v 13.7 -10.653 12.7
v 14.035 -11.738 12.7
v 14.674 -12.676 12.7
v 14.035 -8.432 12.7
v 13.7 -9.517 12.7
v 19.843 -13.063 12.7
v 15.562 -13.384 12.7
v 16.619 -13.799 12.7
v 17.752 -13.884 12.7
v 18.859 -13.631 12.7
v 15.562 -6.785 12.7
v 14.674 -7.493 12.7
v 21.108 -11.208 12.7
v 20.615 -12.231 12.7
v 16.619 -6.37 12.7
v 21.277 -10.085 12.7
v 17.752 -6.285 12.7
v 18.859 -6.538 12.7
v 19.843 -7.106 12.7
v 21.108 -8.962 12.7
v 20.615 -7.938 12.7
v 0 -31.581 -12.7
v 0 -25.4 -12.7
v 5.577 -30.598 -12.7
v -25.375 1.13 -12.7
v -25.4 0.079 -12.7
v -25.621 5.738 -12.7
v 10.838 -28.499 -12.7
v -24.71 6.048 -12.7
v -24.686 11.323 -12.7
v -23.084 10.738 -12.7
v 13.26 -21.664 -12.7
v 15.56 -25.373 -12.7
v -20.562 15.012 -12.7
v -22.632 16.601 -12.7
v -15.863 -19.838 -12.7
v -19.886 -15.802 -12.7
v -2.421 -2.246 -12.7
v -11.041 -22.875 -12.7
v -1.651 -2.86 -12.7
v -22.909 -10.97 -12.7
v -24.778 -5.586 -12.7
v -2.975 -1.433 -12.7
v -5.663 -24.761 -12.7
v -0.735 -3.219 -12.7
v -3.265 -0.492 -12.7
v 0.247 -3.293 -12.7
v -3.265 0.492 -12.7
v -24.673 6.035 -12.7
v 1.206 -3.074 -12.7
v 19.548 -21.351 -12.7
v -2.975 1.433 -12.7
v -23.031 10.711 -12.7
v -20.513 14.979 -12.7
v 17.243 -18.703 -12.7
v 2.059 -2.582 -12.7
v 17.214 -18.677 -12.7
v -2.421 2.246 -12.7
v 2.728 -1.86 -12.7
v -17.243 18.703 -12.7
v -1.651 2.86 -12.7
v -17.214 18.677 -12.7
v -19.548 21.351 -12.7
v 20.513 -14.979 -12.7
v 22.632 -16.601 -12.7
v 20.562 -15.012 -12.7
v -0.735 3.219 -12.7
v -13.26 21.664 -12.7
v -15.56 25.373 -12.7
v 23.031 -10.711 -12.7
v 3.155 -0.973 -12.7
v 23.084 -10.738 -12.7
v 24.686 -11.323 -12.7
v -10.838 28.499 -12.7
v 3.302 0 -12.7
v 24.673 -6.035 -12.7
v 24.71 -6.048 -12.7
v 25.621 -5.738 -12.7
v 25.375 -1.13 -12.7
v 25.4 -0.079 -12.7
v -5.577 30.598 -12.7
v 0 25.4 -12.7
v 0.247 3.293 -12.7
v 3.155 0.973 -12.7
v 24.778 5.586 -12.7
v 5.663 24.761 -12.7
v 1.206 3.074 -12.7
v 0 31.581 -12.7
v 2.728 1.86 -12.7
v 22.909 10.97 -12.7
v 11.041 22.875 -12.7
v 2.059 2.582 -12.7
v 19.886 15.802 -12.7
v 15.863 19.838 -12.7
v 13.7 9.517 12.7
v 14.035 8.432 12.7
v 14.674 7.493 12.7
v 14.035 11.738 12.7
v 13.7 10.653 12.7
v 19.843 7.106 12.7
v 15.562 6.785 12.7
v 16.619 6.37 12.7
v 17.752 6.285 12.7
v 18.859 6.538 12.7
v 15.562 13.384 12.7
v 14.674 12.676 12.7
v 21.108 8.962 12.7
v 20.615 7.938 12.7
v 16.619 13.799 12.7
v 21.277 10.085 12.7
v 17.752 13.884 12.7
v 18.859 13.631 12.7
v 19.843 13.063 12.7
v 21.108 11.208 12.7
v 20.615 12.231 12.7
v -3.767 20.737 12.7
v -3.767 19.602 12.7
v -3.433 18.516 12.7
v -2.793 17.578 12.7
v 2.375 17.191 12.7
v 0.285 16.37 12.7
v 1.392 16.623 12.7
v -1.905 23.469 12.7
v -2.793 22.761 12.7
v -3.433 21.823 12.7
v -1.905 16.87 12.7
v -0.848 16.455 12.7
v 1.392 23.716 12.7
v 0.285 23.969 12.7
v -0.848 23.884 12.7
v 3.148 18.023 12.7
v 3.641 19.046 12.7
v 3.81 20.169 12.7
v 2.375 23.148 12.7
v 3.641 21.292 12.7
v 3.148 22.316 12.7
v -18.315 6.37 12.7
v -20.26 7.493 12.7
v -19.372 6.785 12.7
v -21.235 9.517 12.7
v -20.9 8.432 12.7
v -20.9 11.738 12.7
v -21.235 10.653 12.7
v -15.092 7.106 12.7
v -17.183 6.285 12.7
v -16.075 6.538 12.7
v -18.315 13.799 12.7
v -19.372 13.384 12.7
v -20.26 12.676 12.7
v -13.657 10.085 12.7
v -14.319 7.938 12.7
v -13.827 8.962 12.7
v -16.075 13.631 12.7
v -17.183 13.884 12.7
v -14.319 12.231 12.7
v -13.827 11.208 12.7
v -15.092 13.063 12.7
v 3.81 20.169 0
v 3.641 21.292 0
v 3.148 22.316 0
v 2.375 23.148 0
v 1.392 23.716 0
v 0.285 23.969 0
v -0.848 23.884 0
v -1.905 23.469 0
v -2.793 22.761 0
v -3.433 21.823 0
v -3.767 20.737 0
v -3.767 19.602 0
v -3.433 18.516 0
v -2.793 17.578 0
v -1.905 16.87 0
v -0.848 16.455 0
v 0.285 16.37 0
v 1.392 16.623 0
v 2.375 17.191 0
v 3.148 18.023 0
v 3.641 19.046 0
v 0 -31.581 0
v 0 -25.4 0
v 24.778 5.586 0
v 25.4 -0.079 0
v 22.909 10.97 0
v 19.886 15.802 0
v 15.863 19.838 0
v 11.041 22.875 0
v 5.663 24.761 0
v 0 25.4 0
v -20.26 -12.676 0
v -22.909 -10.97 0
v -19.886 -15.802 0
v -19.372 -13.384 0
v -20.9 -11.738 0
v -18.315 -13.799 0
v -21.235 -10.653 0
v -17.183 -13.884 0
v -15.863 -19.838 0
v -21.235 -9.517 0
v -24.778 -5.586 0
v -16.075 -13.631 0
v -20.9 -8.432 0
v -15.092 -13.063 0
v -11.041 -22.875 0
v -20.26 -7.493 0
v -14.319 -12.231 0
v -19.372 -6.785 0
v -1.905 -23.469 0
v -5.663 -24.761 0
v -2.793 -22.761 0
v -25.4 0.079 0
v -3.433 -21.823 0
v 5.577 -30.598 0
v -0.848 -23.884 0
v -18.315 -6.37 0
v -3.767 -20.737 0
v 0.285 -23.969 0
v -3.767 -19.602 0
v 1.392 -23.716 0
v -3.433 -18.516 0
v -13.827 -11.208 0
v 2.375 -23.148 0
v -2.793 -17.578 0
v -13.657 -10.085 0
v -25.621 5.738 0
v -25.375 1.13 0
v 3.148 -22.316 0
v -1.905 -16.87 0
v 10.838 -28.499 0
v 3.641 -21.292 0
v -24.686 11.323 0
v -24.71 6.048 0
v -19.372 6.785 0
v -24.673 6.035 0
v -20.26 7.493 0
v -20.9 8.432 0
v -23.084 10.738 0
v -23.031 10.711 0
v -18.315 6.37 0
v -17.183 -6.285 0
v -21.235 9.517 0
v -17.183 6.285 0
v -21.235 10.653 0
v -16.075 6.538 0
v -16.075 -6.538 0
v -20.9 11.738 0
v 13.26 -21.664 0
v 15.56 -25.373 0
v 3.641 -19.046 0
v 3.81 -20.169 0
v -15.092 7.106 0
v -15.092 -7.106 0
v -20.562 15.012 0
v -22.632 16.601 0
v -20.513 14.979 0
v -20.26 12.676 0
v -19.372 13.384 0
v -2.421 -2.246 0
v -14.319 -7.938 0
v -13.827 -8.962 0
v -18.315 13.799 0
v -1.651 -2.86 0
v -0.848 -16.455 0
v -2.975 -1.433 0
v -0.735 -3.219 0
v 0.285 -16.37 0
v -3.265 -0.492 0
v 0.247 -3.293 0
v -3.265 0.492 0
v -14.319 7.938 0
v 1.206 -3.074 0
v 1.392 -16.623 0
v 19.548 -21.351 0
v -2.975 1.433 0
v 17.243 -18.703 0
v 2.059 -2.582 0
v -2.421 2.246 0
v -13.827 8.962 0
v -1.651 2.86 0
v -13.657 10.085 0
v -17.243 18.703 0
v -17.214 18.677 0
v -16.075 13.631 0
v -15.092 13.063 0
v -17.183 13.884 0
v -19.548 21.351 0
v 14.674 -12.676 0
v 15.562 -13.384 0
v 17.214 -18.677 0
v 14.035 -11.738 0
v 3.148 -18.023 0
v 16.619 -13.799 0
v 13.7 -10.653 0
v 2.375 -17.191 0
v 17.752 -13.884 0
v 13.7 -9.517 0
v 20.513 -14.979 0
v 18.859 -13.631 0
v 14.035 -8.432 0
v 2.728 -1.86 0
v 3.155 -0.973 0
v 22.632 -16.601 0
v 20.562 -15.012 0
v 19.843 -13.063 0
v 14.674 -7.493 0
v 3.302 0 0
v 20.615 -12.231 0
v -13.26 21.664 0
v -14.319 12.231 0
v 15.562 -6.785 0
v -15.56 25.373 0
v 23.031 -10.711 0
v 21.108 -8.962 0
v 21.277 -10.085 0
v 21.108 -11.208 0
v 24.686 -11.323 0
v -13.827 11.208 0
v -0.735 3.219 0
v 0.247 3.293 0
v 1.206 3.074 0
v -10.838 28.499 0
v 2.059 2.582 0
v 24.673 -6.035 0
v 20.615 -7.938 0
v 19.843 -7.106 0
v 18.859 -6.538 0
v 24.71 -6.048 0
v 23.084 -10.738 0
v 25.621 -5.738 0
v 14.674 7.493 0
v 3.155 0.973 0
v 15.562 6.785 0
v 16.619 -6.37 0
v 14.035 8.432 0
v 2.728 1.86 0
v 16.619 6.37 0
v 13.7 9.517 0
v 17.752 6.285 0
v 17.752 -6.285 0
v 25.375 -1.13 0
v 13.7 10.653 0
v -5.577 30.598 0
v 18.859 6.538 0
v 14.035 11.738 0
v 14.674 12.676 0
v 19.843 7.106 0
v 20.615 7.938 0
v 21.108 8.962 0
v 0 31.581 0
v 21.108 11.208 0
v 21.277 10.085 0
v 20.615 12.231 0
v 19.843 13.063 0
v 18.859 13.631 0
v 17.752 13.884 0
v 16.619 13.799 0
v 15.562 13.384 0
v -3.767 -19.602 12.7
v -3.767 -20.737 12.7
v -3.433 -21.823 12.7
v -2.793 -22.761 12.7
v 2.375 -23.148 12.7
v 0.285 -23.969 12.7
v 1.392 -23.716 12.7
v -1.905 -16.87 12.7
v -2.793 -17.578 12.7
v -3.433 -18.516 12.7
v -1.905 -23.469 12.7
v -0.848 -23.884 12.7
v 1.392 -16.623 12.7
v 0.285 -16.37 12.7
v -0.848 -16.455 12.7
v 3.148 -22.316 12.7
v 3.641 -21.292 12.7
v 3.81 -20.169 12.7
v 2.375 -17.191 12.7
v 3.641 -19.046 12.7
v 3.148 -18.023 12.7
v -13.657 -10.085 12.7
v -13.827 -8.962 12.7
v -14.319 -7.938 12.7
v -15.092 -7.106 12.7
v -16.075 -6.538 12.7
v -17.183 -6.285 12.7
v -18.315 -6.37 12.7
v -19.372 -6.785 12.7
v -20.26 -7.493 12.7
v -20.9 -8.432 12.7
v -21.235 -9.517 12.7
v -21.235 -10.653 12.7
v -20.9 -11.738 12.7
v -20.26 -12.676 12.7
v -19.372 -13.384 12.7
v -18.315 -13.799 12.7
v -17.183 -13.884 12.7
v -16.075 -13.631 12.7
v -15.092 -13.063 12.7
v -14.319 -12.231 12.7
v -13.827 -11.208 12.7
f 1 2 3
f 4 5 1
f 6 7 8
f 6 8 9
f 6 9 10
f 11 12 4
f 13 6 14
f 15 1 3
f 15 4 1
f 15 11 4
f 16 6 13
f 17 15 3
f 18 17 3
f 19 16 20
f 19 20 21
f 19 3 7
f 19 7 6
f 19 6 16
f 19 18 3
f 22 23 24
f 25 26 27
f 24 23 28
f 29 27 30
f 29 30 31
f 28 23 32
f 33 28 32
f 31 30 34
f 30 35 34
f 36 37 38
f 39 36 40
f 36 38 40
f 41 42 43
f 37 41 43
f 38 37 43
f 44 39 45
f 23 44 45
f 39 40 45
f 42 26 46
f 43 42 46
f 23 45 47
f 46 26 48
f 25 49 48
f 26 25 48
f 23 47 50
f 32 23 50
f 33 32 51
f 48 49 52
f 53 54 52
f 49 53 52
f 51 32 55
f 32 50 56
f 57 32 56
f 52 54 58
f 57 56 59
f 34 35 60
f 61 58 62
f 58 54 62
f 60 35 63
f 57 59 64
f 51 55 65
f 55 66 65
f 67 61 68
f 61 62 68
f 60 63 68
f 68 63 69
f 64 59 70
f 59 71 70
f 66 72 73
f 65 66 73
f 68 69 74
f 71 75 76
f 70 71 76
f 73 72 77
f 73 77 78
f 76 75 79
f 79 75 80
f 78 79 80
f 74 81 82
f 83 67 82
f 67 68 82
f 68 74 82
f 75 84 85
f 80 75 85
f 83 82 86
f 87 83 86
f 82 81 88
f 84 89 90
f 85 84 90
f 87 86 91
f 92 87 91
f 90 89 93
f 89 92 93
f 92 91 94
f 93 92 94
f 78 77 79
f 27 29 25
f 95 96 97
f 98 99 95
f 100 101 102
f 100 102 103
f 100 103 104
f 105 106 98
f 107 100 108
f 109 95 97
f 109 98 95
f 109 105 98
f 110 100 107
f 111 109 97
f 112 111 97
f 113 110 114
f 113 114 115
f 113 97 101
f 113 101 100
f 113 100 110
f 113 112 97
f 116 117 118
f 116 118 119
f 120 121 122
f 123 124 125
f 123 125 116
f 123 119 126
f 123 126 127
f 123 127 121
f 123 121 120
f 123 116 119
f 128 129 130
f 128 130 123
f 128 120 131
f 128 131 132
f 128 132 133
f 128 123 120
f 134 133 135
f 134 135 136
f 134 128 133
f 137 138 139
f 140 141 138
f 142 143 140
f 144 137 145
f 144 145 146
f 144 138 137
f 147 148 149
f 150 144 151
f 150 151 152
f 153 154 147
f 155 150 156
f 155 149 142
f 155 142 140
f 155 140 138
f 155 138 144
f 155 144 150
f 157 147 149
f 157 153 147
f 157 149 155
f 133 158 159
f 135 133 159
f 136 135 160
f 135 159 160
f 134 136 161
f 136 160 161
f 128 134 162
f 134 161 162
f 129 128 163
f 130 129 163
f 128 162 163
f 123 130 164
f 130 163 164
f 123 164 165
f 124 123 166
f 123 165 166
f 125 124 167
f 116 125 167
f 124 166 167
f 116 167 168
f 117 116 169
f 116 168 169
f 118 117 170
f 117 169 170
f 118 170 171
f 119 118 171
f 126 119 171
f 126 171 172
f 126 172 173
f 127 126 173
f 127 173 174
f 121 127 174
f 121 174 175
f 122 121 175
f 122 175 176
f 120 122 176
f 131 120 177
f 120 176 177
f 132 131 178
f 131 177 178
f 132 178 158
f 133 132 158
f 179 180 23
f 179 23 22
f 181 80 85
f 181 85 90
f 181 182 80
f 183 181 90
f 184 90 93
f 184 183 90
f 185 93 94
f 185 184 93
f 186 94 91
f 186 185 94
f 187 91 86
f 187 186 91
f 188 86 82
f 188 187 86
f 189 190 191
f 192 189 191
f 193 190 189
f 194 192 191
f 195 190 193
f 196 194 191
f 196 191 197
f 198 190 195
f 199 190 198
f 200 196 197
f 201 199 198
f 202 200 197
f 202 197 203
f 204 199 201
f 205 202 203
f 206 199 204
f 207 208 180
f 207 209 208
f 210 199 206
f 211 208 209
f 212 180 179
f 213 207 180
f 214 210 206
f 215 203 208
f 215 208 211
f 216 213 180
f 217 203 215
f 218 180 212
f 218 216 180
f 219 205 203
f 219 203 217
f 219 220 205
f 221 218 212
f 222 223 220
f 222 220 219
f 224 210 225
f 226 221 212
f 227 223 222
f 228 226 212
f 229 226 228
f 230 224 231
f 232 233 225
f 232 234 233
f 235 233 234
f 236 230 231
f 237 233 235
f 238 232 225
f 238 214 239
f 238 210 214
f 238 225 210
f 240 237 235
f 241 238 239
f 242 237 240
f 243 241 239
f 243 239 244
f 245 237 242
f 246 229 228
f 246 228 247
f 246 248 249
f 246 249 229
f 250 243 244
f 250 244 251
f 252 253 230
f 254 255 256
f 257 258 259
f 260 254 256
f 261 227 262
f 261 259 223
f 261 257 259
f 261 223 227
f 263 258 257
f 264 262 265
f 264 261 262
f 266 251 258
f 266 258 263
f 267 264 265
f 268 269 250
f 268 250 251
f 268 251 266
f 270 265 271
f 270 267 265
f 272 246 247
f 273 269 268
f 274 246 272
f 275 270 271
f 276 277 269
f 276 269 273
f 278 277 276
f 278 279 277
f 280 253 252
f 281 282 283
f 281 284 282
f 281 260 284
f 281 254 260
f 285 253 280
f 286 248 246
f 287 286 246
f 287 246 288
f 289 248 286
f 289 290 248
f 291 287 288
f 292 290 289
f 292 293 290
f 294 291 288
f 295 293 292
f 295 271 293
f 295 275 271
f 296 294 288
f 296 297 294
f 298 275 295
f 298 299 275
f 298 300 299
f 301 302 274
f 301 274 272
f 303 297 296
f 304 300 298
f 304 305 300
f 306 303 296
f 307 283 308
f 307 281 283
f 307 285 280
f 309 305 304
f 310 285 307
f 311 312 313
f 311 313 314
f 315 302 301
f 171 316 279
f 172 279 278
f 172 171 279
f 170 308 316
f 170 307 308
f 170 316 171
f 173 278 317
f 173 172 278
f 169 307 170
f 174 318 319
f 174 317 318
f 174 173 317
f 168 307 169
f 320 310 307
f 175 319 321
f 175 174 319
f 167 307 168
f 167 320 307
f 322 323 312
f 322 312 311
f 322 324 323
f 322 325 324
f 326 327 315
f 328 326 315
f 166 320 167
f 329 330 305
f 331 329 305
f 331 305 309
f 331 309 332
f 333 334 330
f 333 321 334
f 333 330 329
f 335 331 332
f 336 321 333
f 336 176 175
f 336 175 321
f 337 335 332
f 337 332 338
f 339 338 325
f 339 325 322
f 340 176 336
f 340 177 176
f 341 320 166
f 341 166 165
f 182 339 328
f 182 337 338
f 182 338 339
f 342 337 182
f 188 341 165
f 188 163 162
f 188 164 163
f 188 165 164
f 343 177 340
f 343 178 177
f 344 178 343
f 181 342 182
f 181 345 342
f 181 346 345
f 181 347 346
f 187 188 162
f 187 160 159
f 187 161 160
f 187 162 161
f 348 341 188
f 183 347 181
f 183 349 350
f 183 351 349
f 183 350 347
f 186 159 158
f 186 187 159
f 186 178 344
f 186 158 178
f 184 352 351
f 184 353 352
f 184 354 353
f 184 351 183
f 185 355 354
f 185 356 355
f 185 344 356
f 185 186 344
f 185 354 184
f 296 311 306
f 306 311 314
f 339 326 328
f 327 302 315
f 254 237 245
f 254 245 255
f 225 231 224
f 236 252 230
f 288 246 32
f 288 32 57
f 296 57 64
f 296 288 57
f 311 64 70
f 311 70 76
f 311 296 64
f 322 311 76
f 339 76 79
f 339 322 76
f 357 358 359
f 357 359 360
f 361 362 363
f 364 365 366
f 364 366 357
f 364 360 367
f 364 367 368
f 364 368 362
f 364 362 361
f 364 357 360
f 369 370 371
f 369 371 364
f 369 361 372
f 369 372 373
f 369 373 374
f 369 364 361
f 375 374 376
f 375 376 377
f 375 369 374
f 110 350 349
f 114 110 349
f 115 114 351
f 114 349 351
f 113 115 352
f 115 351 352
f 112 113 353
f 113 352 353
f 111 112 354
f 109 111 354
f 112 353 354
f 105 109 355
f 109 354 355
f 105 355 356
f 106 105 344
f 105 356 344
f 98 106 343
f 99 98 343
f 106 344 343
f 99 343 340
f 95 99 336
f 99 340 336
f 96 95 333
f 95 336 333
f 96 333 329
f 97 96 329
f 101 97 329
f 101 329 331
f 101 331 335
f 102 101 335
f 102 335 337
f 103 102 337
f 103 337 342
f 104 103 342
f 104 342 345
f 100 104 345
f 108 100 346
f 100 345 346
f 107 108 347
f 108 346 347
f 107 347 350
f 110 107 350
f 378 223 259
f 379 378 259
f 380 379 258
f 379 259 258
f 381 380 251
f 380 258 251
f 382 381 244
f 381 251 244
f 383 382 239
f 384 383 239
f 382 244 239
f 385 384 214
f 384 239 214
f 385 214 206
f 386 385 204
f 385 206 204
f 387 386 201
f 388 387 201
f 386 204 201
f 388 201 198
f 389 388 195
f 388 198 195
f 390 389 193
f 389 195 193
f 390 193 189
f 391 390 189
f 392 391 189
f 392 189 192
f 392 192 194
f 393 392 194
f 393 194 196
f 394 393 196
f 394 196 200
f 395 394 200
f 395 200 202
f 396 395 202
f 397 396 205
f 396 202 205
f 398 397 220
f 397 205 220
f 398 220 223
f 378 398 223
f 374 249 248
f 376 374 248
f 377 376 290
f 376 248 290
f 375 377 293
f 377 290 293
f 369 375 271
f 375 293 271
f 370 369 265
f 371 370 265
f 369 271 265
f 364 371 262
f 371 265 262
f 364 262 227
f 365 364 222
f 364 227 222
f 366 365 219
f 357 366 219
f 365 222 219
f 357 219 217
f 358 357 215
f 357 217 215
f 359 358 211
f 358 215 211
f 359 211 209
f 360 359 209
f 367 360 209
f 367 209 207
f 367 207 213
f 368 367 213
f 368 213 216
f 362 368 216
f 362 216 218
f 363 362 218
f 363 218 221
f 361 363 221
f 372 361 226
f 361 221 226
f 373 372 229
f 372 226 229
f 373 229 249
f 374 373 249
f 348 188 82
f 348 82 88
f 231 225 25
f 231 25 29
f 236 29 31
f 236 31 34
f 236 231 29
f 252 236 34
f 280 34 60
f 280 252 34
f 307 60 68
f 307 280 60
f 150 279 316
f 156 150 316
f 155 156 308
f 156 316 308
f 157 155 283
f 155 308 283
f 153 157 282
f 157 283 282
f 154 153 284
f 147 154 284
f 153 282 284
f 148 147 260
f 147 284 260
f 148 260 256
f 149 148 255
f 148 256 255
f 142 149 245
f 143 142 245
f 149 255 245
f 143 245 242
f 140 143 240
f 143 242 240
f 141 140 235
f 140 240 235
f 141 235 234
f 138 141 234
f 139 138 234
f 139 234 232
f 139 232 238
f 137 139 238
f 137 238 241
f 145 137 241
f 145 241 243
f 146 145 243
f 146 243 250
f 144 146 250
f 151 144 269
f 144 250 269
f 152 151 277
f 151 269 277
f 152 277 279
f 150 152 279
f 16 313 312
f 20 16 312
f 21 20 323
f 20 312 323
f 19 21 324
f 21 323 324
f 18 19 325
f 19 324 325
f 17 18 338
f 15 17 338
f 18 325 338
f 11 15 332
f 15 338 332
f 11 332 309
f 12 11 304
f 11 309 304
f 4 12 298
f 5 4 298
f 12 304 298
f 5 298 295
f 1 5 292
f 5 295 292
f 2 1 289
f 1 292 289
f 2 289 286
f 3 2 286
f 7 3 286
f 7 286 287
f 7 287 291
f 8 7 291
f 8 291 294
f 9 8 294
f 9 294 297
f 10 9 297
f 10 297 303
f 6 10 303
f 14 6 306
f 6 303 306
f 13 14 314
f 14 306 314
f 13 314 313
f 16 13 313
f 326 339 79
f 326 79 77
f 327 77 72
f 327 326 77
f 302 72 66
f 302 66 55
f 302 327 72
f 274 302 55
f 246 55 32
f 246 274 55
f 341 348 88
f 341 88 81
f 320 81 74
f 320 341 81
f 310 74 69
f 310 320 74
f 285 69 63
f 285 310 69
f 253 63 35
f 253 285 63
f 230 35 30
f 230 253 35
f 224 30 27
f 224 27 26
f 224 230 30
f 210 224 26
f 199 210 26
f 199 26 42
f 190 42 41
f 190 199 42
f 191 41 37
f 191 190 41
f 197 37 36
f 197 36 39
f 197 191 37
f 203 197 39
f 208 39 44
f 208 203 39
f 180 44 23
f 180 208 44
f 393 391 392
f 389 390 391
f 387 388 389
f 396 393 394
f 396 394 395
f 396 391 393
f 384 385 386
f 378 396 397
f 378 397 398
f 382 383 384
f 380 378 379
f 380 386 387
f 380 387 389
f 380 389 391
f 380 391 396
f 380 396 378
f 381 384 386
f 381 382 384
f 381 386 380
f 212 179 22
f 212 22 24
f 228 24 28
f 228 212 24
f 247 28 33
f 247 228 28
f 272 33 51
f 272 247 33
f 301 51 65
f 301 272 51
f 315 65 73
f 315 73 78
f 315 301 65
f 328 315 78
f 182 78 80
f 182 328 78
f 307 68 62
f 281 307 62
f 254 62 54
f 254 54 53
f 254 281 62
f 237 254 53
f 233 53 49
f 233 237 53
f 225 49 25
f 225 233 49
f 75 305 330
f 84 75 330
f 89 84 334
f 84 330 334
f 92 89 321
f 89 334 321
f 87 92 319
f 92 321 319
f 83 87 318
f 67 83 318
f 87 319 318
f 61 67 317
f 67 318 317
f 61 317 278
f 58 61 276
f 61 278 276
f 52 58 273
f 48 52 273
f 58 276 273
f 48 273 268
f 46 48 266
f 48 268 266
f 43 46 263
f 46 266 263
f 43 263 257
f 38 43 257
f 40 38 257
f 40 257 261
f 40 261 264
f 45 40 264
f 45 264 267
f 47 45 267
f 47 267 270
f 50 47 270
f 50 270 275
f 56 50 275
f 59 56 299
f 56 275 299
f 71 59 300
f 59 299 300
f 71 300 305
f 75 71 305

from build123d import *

# Parameters (mm, degrees)
F0_R     = 25.4
F1_DEPTH = 12.7
F3_DEPTH = 12.7
F4_R     = 3.81
F5_DEPTH = 12.7
F6_R     = 3.302
F7_DEPTH = 12.7


with BuildPart() as f1:
    # F0 (on Top) → F1 (new body)
    with BuildSketch(Plane.XY):
        Circle(F0_R)
    extrude(amount=-F1_DEPTH)

    # F2 (on Top) → F3 (join)
    with BuildSketch(Plane.XY):
        with BuildLine():
            ThreePointArc((-25.388571, 0), (-18.019038, 17.965669), (0, 25.203731))
            Line((0, 25.203731), (0, 31.581391))
            ThreePointArc((0, 31.581391), (-19.572424, 21.320095), (-25.388571, 0))
        make_face()
        with BuildLine():
            Line((0, -25.203731), (0, -31.581391))
            ThreePointArc((0, -31.581391), (19.572424, -21.320095), (25.388571, 0))
            ThreePointArc((25.388571, 0), (18.019038, -17.965669), (0, -25.203731))
        make_face()
    extrude(amount=-F3_DEPTH)

    # F4 (on Top) → F5 (join)
    with BuildSketch(Plane.XY):
        with Locations((-17.467251, 10.084722)):
            Circle(F4_R)
        with Locations((0, 20.169444)):
            Circle(F4_R)
        with Locations((17.467251, 10.084722)):
            Circle(F4_R)
        with Locations((17.467251, -10.084722)):
            Circle(F4_R)
        with Locations((0, -20.169444)):
            Circle(F4_R)
        with Locations((-17.467251, -10.084722)):
            Circle(F4_R)
    extrude(amount=F5_DEPTH)

    # F6 (on Top) → F7 (cut)
    with BuildSketch(Plane.XY):
        Circle(F6_R)
    extrude(amount=-F7_DEPTH, mode=Mode.SUBTRACT)


solid = f1.part
